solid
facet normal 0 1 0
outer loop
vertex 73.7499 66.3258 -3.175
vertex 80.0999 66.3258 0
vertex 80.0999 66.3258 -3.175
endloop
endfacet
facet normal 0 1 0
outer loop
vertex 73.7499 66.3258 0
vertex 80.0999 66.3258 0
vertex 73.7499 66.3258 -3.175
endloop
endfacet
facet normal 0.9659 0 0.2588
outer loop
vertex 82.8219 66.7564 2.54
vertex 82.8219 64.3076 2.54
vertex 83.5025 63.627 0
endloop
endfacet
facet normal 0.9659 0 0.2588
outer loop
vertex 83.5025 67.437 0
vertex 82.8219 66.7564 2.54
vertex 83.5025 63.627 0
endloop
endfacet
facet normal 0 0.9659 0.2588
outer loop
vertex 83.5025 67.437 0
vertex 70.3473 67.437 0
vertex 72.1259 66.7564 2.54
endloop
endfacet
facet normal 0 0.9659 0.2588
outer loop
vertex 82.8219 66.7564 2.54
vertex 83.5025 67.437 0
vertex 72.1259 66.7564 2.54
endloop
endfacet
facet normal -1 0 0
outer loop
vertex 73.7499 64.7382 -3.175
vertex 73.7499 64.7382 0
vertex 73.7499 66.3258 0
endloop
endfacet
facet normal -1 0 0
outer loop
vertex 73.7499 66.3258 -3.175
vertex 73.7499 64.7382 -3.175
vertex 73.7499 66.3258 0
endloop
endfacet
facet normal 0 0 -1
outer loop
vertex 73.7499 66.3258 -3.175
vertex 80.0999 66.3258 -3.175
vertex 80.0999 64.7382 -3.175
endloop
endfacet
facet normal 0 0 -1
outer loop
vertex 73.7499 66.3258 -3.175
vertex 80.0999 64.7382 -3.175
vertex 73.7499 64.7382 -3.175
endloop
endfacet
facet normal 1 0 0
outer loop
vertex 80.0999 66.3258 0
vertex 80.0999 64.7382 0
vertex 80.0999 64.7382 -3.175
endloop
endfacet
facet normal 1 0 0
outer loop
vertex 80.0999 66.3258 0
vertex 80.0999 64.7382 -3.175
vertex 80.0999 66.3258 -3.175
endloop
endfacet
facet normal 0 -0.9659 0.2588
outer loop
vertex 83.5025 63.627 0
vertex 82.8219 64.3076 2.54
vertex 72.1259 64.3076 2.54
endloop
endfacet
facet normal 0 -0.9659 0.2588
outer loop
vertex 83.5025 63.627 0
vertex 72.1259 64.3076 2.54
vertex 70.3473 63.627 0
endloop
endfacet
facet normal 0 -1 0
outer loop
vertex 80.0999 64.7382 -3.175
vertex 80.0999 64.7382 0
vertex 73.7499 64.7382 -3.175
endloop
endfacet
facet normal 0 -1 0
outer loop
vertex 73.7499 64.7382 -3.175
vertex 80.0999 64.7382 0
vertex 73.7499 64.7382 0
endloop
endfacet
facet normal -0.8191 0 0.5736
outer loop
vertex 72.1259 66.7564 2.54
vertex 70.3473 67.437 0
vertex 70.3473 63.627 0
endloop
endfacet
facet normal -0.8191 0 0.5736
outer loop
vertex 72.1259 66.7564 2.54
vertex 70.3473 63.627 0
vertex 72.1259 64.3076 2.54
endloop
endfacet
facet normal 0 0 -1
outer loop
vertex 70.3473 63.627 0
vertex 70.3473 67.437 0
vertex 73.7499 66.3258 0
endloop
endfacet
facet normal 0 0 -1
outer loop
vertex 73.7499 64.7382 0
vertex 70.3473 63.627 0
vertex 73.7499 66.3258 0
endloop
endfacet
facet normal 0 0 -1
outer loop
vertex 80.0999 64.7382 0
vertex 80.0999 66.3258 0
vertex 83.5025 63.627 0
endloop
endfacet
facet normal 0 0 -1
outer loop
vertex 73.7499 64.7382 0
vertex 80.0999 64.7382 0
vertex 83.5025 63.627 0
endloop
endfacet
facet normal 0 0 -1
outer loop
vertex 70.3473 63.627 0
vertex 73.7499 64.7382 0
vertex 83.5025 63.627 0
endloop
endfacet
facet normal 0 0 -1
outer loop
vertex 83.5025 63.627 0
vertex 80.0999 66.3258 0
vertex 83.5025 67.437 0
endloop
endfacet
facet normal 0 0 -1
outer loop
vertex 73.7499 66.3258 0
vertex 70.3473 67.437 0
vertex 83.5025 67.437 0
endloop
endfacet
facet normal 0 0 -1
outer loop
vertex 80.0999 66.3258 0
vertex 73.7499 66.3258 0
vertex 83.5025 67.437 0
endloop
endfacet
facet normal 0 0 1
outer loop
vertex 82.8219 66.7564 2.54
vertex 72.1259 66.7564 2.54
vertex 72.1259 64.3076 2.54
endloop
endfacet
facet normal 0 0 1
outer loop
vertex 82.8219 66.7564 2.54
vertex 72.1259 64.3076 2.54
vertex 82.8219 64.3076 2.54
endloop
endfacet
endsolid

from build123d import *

# Parameters (mm, degrees)
SKETCH1_W           = 13.155170484
SKETCH1_H           = 3.81
BOSS_EXTRUDE1_DEPTH = 2.54
CHAMFER1_SIZE       = 2.54
CHAMFER1_SIZE_2     = 1.778527147
CHAMFER2_SIZE       = 0.680590949
CHAMFER2_SIZE_2     = 2.54
SKETCH2_W           = 6.35
SKETCH2_H           = 1.5875
BOSS_EXTRUDE3_DEPTH = 3.175


with BuildPart() as part:
    # Sketch1 → Boss-Extrude1 (new body)
    with BuildSketch(Plane.XY):
        with Locations((76.924914758, 65.532)):
            Rectangle(SKETCH1_W, SKETCH1_H)
    extrude(amount=BOSS_EXTRUDE1_DEPTH)

    # Chamfer1
    # the kernel refuses this chamfer: 2.54, 1.778527147 mm, written as the material it takes off along each edge
    with BuildSketch(Plane(origin=(70.347329516, 73.996682665, 2.54), x_dir=(-0.02220967419845826, 0, -0.9997533347641299), z_dir=(0, -1, 0))) as chamfer1_piece_1:
        Polygon((CHAMFER1_SIZE * 0.999753334764, CHAMFER1_SIZE * 0.0222096741985), (-CHAMFER1_SIZE_2 * 0.0222096741991, CHAMFER1_SIZE_2 * 0.999753334794), (0, 0), align=None)
    extrude(amount=16.92936533, mode=Mode.SUBTRACT)

    # Chamfer2
    # the kernel refuses this chamfer: 2.54, 0.680590949 mm, written as the material it takes off along each edge
    with BuildSketch(Plane(origin=(65.530183875, 63.627, 2.54), x_dir=(0, 0.9905000388259545, 0.13751244702128823), z_dir=(1, 0, 0))) as chamfer2_piece_1:
        Polygon((CHAMFER2_SIZE * 0.990500038499, -CHAMFER2_SIZE * 0.137512446976), (-CHAMFER2_SIZE_2 * 0.137512447021, -CHAMFER2_SIZE_2 * 0.990500038826), (0, 0), align=None)
    extrude(amount=24.567988913, mode=Mode.SUBTRACT)
    with BuildSketch(Plane(origin=(83.5025, 57.031327212, 2.54), x_dir=(-0.9905000388259543, 0, 0.13751244702128956), z_dir=(0, 1, 0))) as chamfer2_piece_2:
        Polygon((CHAMFER2_SIZE * 0.990500038499, -CHAMFER2_SIZE * 0.137512446976), (-CHAMFER2_SIZE_2 * 0.137512447021, -CHAMFER2_SIZE_2 * 0.990500038826), (0, 0), align=None)
    extrude(amount=17.001345577, mode=Mode.SUBTRACT)
    with BuildSketch(Plane(origin=(90.098172788, 67.437, 2.54), x_dir=(0, 0.009967146577158238, -0.9999503267608394), z_dir=(-1, 0, 0))) as chamfer2_piece_3:
        Polygon((CHAMFER2_SIZE_2 * 0.999950326761, CHAMFER2_SIZE_2 * 0.00996714657716), (-CHAMFER2_SIZE * 0.00996714657386, CHAMFER2_SIZE * 0.99995032643), (0, 0), align=None)
    extrude(amount=24.567988913, mode=Mode.SUBTRACT)

    # Sketch2 → Boss-Extrude3 (add)
    with BuildSketch(Plane(origin=(0, 0, 0), x_dir=(-1, 0, 0), z_dir=(0, 0, -1))):
        with Locations((-76.924914758, 65.532)):
            Rectangle(SKETCH2_W, SKETCH2_H)
    extrude(amount=BOSS_EXTRUDE3_DEPTH)


solid = part.part
